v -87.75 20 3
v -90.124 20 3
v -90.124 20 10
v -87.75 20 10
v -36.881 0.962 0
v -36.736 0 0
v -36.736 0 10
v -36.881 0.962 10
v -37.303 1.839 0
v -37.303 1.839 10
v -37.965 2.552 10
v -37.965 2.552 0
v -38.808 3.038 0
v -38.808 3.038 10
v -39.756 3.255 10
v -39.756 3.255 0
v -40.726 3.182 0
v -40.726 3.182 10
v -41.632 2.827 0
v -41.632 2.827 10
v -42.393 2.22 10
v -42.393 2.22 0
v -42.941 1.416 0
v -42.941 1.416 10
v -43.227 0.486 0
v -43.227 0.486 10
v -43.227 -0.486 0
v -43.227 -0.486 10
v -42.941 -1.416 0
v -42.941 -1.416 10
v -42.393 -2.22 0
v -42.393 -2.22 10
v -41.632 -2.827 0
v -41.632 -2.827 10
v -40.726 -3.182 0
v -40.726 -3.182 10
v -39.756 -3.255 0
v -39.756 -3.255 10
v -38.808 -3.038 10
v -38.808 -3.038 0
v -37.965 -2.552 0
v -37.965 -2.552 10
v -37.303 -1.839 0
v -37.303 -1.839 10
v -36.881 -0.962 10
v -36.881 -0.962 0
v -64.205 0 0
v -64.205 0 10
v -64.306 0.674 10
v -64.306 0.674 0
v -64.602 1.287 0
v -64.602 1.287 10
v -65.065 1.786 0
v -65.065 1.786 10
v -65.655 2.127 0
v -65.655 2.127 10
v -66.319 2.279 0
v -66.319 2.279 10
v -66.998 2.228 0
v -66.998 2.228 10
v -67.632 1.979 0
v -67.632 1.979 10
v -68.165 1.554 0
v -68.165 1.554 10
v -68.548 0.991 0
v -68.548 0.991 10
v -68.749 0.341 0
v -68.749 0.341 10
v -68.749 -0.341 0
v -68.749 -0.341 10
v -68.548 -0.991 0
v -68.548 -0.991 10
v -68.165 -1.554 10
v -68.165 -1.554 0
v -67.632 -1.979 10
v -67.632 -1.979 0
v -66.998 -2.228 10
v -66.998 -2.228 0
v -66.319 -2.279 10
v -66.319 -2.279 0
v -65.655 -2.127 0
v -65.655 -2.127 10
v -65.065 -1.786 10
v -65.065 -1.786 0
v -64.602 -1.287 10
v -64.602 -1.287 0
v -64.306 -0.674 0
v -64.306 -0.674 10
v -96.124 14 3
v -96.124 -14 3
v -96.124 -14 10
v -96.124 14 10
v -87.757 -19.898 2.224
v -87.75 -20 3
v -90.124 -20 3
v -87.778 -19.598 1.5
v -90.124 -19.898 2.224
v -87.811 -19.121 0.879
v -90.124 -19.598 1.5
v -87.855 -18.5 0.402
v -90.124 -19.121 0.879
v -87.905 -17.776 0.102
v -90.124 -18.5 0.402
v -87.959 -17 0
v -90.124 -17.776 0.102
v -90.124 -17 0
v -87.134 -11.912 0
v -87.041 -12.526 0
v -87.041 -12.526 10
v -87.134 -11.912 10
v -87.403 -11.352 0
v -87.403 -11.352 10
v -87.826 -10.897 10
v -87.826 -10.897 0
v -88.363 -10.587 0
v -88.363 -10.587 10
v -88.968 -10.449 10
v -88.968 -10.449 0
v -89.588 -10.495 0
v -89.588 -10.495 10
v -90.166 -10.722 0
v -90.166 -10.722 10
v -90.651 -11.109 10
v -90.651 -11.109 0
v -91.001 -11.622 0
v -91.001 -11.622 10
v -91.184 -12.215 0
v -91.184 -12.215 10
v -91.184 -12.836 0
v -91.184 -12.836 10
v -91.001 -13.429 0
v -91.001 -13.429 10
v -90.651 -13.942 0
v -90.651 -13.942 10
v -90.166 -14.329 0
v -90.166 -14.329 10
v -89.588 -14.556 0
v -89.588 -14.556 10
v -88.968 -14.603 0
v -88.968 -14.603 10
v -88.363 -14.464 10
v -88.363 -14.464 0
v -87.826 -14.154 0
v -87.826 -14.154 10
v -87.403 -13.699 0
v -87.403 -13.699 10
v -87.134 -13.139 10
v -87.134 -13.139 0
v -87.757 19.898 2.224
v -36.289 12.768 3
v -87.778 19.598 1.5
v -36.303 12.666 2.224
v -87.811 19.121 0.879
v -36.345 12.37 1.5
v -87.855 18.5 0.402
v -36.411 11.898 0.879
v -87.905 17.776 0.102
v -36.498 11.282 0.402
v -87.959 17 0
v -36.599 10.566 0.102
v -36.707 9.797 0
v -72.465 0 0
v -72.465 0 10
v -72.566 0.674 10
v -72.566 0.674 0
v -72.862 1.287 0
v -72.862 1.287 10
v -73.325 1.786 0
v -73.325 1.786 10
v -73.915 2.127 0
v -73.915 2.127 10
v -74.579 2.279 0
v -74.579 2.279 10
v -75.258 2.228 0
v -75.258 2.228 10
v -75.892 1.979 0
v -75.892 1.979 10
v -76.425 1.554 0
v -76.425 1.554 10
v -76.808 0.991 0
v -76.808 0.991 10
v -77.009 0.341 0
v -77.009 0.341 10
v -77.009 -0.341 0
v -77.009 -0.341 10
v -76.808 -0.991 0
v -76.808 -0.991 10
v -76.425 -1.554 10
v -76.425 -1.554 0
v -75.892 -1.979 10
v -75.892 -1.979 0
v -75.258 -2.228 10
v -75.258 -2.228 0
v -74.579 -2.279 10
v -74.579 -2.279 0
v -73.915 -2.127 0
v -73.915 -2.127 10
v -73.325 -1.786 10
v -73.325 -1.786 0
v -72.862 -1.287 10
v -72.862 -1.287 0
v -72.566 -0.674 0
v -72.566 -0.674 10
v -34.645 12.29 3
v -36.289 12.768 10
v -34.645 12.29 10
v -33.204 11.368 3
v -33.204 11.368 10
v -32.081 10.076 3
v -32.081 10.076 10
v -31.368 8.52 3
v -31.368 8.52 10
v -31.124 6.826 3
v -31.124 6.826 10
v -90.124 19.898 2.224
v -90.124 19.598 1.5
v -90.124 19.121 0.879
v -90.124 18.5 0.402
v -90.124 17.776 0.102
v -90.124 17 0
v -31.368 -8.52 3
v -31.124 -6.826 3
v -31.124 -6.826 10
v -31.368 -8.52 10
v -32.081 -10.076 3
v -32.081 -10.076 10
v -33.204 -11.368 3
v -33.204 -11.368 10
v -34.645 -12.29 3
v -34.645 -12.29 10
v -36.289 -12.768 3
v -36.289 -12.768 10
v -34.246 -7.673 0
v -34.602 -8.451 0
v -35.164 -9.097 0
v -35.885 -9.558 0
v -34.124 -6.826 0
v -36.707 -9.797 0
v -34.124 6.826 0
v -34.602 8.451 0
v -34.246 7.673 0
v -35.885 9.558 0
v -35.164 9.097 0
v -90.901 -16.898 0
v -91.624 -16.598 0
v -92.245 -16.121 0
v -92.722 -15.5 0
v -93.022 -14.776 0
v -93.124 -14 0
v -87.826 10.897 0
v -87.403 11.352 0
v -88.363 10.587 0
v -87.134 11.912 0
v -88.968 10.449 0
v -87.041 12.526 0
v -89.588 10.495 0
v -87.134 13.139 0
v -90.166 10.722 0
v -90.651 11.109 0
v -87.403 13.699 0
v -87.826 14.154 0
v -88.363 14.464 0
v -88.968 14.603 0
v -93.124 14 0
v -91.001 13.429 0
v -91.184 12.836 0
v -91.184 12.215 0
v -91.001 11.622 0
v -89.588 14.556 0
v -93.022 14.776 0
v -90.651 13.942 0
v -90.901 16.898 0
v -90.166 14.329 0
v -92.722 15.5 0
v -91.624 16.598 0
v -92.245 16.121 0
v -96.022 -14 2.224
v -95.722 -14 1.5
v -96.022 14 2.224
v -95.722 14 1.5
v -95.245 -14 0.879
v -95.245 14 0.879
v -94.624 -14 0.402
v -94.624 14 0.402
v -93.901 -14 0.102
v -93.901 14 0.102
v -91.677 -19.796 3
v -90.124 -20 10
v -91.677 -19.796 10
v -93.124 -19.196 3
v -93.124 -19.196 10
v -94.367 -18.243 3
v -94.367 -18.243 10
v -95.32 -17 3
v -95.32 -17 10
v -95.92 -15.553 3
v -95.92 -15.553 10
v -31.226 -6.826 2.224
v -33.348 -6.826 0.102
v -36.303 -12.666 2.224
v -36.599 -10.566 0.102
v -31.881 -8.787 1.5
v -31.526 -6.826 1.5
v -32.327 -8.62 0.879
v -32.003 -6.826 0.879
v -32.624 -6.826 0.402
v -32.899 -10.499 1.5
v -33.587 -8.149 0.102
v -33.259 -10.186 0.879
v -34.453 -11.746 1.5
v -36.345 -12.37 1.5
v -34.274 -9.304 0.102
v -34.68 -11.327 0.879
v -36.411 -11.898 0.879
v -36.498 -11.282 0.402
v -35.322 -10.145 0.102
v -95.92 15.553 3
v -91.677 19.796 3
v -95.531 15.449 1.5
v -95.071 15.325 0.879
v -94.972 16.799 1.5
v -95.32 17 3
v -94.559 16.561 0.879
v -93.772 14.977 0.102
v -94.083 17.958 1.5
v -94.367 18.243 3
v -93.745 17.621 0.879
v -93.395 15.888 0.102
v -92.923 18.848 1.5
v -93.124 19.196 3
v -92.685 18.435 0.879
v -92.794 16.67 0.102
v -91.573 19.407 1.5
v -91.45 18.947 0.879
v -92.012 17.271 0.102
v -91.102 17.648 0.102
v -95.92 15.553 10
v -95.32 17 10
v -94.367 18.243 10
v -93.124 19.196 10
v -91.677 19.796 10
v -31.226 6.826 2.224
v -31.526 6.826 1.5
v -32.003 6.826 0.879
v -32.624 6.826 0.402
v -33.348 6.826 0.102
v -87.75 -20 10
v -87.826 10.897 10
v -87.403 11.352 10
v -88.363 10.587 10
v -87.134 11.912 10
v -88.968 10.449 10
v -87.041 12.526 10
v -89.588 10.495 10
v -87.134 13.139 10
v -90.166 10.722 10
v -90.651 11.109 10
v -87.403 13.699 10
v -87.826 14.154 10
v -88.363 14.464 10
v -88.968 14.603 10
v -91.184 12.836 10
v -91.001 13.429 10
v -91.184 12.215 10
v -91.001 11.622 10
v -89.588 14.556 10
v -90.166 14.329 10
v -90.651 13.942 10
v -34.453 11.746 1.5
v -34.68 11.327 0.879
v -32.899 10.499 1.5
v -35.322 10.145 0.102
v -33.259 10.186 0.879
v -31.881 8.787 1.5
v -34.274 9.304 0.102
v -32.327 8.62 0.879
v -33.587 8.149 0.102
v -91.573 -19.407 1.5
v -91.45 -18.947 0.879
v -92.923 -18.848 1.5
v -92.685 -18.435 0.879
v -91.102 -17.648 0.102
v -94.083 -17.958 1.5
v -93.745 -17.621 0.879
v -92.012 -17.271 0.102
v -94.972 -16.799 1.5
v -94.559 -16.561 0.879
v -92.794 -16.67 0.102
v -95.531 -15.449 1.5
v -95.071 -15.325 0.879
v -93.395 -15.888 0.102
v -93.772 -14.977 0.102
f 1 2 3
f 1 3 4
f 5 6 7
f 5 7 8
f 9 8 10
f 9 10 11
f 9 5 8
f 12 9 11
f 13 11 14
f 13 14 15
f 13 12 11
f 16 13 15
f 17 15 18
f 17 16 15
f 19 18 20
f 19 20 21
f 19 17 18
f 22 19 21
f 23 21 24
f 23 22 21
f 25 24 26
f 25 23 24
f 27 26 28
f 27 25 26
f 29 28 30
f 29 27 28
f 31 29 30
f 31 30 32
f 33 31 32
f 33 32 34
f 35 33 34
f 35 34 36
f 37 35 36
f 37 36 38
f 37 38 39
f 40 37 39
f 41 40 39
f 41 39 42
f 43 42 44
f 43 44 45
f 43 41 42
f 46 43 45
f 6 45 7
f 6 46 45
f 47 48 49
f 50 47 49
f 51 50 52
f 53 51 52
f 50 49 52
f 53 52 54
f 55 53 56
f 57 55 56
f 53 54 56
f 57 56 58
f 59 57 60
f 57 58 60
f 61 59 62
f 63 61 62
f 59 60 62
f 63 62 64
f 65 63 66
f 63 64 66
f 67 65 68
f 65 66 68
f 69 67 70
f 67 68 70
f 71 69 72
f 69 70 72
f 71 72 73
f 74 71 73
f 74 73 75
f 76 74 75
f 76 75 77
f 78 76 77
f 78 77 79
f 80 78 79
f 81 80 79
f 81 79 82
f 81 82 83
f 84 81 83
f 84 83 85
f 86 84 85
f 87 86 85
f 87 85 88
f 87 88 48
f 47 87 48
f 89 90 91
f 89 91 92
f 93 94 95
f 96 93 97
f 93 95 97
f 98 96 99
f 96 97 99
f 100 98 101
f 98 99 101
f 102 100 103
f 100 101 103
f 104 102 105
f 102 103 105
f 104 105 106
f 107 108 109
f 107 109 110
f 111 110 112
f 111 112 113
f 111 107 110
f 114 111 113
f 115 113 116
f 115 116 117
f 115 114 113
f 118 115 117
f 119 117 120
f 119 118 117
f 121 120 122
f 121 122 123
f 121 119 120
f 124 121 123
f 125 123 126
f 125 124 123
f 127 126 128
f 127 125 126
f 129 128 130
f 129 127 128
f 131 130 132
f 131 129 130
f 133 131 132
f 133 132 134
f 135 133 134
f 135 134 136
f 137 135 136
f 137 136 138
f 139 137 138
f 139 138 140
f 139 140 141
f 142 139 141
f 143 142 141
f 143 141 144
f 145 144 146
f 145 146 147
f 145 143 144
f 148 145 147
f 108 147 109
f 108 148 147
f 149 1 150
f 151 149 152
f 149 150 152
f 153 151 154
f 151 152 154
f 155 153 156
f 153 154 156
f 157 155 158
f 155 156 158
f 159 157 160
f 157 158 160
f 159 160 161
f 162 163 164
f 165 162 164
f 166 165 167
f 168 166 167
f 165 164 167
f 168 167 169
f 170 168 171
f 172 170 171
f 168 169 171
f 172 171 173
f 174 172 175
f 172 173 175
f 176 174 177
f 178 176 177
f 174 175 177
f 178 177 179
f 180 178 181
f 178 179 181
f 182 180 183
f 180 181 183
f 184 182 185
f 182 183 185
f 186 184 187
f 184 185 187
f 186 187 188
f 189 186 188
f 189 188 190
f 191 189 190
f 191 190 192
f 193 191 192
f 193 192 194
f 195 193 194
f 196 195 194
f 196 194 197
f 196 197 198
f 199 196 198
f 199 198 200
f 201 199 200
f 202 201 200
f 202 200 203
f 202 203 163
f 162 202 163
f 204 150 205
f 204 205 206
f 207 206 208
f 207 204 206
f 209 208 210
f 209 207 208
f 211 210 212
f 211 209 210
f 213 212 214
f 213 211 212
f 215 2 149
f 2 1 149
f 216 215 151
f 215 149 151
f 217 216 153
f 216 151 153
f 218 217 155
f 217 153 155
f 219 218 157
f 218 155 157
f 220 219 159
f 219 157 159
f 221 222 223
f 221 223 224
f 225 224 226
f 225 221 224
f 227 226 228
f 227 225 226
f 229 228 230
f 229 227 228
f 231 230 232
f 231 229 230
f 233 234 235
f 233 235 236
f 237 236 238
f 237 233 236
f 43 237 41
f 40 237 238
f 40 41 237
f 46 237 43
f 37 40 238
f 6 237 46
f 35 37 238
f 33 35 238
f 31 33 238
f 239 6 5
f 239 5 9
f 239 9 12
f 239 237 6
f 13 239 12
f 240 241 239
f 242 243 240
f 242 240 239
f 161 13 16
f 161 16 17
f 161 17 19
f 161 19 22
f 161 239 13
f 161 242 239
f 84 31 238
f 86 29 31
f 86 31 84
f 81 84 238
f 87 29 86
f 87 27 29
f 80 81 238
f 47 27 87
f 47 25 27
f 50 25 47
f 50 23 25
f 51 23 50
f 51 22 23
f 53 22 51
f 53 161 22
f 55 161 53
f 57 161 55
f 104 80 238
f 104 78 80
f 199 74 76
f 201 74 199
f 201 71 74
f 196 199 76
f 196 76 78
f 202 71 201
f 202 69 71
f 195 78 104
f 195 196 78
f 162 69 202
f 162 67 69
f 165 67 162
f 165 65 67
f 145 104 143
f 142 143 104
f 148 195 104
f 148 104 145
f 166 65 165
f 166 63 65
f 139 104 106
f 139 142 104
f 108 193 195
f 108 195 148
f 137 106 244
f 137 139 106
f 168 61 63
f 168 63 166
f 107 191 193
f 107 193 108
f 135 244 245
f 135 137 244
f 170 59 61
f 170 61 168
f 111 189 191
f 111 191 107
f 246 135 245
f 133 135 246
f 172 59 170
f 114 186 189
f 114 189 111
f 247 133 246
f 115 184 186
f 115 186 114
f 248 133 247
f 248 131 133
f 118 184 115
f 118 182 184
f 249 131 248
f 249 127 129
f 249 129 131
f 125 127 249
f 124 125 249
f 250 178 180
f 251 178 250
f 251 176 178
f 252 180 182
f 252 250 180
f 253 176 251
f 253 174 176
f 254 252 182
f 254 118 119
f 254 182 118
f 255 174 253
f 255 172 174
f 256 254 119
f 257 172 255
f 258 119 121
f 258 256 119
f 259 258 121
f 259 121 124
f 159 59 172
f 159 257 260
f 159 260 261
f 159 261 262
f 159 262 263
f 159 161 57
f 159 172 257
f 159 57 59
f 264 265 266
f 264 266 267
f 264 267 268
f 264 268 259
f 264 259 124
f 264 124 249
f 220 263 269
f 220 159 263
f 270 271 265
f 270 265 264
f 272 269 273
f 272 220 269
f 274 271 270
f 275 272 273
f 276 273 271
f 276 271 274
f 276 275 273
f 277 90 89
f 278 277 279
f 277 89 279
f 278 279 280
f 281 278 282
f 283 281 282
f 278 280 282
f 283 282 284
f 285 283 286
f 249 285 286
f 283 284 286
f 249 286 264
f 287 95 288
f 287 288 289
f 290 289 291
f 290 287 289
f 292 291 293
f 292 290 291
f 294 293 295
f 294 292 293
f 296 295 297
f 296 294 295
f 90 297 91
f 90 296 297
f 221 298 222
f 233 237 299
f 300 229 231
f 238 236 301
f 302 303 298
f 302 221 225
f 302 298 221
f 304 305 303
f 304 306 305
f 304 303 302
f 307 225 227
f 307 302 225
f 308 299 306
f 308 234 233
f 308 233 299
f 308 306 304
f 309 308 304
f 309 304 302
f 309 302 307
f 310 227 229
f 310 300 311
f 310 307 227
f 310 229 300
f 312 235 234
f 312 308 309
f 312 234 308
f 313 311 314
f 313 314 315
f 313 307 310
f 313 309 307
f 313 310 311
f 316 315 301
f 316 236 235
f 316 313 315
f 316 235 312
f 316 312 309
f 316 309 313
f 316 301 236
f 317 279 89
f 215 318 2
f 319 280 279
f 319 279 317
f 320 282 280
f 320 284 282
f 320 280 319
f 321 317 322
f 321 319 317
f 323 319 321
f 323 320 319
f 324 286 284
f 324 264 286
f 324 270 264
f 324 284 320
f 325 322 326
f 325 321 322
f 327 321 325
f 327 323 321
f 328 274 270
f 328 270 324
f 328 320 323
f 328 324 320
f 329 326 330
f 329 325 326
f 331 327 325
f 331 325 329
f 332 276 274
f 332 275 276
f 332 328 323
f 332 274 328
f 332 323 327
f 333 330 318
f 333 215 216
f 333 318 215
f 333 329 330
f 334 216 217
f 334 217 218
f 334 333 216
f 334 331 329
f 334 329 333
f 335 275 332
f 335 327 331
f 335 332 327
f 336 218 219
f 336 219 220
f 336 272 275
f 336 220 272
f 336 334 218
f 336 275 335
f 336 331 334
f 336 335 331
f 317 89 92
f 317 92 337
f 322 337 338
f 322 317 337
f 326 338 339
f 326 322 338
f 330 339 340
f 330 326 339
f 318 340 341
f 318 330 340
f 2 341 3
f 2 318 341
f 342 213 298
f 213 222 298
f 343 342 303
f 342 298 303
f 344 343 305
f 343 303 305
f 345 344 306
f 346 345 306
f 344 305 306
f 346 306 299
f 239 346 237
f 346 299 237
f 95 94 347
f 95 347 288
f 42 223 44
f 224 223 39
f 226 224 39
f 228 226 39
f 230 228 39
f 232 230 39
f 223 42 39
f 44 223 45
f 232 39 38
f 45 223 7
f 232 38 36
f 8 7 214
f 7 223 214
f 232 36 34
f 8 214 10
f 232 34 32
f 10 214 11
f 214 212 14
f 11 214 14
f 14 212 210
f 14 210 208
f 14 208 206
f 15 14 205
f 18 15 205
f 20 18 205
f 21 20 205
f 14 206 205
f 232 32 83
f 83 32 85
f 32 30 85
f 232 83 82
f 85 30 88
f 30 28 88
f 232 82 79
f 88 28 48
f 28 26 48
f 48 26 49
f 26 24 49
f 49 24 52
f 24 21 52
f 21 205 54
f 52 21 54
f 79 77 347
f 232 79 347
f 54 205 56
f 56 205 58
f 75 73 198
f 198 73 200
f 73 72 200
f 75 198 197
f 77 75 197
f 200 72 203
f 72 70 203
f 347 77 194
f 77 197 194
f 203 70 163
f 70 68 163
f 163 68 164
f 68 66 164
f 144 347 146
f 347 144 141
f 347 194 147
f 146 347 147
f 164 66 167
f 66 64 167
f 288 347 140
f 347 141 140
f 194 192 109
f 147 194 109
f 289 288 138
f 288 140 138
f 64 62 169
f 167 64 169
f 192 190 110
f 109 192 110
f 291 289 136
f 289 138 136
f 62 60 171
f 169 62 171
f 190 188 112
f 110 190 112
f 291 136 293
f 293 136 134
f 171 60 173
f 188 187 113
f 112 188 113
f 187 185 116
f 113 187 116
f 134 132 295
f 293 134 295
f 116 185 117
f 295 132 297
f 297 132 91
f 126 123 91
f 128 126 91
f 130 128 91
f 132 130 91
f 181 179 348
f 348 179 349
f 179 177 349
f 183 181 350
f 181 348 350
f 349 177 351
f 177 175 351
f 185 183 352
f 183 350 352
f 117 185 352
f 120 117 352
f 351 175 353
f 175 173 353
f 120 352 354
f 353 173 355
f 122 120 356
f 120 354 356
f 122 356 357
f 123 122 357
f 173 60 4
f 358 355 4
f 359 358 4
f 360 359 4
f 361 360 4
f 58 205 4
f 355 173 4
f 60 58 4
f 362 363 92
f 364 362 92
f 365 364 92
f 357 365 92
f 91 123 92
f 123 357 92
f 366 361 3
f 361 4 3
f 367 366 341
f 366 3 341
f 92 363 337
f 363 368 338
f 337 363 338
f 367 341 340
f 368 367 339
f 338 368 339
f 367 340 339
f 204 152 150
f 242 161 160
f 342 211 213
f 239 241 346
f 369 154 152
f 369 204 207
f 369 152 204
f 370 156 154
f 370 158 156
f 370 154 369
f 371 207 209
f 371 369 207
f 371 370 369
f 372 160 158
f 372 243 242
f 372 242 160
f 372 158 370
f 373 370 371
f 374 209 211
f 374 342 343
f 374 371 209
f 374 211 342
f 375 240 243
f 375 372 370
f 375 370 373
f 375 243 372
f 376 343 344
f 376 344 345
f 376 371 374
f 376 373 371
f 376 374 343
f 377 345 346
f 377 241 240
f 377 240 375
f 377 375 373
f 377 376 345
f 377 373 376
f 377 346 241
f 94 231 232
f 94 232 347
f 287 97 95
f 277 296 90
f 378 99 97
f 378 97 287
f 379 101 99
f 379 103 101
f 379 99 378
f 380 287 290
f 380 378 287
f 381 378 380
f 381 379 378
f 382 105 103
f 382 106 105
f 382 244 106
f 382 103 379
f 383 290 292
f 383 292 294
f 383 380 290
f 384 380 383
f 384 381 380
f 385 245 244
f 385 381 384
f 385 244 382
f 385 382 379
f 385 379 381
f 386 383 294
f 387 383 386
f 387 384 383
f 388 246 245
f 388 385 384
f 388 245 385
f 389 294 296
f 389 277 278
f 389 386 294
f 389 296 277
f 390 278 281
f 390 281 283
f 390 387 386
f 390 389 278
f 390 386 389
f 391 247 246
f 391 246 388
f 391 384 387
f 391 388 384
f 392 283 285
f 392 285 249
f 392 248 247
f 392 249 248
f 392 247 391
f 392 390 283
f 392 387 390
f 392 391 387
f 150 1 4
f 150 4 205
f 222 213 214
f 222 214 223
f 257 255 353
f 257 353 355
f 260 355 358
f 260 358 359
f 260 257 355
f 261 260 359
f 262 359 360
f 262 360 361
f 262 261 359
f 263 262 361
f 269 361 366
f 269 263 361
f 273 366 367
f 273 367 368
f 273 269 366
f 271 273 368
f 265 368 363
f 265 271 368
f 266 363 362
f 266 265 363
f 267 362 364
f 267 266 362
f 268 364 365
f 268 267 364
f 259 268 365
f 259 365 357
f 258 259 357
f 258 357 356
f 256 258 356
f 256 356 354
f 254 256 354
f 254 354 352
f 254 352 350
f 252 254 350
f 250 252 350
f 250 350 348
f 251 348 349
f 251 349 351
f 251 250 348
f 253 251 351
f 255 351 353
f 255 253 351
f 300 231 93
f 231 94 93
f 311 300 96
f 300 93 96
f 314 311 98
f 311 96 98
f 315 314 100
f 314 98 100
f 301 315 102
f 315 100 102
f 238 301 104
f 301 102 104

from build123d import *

# Parameters (mm, degrees)
SKETCH1_R            = 2.0828
SKETCH1_R_2          = 3.2639
BASE_EXTRUDE_DEPTH   = 10
SKETCH3_R            = 2.285
HOLES_TO_CLAMP_DEPTH = 11
FILLET2_R            = 3


with BuildPart() as part:
    # Sketch1 → Base-Extrude (new body)
    with BuildSketch(Plane.XY):
        with BuildLine():
            Line((-90.124126187, 20), (-87.749643874, 20))
            Line((-87.749643874, 20), (-36.289087581, 12.767690464))
            ThreePointArc((-36.289087581, 12.767690464), (-32.595868705, 10.762436226), (-31.124126187, 6.826082052))
            Line((-31.124126187, 6.826082052), (-31.124126187, -6.826082052))
            ThreePointArc((-31.124126187, -6.826082052), (-32.595868705, -10.762436226), (-36.289087581, -12.767690464))
            Line((-36.289087581, -12.767690464), (-87.749643874, -20))
            Line((-87.749643874, -20), (-90.124126187, -20))
            ThreePointArc((-90.124126187, -20), (-94.366766874, -18.242640687), (-96.124126187, -14))
            Line((-96.124126187, -14), (-96.124126187, 14))
            ThreePointArc((-96.124126187, 14), (-94.366766874, 18.242640687), (-90.124126187, 20))
        make_face()
        with Locations((-89.124126187, 12.525579086)):
            Circle(SKETCH1_R, mode=Mode.SUBTRACT)
        with Locations((-40, 0)):
            Circle(SKETCH1_R_2, mode=Mode.SUBTRACT)
        with Locations((-89.124126187, -12.525579086)):
            Circle(SKETCH1_R, mode=Mode.SUBTRACT)
    extrude(amount=BASE_EXTRUDE_DEPTH)

    # Sketch3 → Holes to Clamp (cut, through all)
    with BuildSketch(Plane.XY.offset(10)):
        with Locations((-66.489576187, 0)):
            Circle(SKETCH3_R)
        with Locations((-74.749576187, 0)):
            Circle(SKETCH3_R)
    extrude(amount=-HOLES_TO_CLAMP_DEPTH, mode=Mode.SUBTRACT)

    # Fillet2
    fillet2_edges = [part.edges().sort_by_distance(p)[0] for p in [
        (-88.93688503, 20, 0),
        (-62.019365727, 16.383845232, 0),
        (-32.595868705, 10.762436226, 0),
        (-31.124126187, 0, 0),
        (-32.595868705, -10.762436226, 0),
        (-62.019365727, -16.383845232, 0),
        (-88.93688503, -20, 0),
        (-94.366766874, -18.242640687, 0),
        (-96.124126187, 0, 0),
        (-94.366766874, 18.242640687, 0),
    ]]
    fillet(fillet2_edges, radius=FILLET2_R)


solid = part.part
